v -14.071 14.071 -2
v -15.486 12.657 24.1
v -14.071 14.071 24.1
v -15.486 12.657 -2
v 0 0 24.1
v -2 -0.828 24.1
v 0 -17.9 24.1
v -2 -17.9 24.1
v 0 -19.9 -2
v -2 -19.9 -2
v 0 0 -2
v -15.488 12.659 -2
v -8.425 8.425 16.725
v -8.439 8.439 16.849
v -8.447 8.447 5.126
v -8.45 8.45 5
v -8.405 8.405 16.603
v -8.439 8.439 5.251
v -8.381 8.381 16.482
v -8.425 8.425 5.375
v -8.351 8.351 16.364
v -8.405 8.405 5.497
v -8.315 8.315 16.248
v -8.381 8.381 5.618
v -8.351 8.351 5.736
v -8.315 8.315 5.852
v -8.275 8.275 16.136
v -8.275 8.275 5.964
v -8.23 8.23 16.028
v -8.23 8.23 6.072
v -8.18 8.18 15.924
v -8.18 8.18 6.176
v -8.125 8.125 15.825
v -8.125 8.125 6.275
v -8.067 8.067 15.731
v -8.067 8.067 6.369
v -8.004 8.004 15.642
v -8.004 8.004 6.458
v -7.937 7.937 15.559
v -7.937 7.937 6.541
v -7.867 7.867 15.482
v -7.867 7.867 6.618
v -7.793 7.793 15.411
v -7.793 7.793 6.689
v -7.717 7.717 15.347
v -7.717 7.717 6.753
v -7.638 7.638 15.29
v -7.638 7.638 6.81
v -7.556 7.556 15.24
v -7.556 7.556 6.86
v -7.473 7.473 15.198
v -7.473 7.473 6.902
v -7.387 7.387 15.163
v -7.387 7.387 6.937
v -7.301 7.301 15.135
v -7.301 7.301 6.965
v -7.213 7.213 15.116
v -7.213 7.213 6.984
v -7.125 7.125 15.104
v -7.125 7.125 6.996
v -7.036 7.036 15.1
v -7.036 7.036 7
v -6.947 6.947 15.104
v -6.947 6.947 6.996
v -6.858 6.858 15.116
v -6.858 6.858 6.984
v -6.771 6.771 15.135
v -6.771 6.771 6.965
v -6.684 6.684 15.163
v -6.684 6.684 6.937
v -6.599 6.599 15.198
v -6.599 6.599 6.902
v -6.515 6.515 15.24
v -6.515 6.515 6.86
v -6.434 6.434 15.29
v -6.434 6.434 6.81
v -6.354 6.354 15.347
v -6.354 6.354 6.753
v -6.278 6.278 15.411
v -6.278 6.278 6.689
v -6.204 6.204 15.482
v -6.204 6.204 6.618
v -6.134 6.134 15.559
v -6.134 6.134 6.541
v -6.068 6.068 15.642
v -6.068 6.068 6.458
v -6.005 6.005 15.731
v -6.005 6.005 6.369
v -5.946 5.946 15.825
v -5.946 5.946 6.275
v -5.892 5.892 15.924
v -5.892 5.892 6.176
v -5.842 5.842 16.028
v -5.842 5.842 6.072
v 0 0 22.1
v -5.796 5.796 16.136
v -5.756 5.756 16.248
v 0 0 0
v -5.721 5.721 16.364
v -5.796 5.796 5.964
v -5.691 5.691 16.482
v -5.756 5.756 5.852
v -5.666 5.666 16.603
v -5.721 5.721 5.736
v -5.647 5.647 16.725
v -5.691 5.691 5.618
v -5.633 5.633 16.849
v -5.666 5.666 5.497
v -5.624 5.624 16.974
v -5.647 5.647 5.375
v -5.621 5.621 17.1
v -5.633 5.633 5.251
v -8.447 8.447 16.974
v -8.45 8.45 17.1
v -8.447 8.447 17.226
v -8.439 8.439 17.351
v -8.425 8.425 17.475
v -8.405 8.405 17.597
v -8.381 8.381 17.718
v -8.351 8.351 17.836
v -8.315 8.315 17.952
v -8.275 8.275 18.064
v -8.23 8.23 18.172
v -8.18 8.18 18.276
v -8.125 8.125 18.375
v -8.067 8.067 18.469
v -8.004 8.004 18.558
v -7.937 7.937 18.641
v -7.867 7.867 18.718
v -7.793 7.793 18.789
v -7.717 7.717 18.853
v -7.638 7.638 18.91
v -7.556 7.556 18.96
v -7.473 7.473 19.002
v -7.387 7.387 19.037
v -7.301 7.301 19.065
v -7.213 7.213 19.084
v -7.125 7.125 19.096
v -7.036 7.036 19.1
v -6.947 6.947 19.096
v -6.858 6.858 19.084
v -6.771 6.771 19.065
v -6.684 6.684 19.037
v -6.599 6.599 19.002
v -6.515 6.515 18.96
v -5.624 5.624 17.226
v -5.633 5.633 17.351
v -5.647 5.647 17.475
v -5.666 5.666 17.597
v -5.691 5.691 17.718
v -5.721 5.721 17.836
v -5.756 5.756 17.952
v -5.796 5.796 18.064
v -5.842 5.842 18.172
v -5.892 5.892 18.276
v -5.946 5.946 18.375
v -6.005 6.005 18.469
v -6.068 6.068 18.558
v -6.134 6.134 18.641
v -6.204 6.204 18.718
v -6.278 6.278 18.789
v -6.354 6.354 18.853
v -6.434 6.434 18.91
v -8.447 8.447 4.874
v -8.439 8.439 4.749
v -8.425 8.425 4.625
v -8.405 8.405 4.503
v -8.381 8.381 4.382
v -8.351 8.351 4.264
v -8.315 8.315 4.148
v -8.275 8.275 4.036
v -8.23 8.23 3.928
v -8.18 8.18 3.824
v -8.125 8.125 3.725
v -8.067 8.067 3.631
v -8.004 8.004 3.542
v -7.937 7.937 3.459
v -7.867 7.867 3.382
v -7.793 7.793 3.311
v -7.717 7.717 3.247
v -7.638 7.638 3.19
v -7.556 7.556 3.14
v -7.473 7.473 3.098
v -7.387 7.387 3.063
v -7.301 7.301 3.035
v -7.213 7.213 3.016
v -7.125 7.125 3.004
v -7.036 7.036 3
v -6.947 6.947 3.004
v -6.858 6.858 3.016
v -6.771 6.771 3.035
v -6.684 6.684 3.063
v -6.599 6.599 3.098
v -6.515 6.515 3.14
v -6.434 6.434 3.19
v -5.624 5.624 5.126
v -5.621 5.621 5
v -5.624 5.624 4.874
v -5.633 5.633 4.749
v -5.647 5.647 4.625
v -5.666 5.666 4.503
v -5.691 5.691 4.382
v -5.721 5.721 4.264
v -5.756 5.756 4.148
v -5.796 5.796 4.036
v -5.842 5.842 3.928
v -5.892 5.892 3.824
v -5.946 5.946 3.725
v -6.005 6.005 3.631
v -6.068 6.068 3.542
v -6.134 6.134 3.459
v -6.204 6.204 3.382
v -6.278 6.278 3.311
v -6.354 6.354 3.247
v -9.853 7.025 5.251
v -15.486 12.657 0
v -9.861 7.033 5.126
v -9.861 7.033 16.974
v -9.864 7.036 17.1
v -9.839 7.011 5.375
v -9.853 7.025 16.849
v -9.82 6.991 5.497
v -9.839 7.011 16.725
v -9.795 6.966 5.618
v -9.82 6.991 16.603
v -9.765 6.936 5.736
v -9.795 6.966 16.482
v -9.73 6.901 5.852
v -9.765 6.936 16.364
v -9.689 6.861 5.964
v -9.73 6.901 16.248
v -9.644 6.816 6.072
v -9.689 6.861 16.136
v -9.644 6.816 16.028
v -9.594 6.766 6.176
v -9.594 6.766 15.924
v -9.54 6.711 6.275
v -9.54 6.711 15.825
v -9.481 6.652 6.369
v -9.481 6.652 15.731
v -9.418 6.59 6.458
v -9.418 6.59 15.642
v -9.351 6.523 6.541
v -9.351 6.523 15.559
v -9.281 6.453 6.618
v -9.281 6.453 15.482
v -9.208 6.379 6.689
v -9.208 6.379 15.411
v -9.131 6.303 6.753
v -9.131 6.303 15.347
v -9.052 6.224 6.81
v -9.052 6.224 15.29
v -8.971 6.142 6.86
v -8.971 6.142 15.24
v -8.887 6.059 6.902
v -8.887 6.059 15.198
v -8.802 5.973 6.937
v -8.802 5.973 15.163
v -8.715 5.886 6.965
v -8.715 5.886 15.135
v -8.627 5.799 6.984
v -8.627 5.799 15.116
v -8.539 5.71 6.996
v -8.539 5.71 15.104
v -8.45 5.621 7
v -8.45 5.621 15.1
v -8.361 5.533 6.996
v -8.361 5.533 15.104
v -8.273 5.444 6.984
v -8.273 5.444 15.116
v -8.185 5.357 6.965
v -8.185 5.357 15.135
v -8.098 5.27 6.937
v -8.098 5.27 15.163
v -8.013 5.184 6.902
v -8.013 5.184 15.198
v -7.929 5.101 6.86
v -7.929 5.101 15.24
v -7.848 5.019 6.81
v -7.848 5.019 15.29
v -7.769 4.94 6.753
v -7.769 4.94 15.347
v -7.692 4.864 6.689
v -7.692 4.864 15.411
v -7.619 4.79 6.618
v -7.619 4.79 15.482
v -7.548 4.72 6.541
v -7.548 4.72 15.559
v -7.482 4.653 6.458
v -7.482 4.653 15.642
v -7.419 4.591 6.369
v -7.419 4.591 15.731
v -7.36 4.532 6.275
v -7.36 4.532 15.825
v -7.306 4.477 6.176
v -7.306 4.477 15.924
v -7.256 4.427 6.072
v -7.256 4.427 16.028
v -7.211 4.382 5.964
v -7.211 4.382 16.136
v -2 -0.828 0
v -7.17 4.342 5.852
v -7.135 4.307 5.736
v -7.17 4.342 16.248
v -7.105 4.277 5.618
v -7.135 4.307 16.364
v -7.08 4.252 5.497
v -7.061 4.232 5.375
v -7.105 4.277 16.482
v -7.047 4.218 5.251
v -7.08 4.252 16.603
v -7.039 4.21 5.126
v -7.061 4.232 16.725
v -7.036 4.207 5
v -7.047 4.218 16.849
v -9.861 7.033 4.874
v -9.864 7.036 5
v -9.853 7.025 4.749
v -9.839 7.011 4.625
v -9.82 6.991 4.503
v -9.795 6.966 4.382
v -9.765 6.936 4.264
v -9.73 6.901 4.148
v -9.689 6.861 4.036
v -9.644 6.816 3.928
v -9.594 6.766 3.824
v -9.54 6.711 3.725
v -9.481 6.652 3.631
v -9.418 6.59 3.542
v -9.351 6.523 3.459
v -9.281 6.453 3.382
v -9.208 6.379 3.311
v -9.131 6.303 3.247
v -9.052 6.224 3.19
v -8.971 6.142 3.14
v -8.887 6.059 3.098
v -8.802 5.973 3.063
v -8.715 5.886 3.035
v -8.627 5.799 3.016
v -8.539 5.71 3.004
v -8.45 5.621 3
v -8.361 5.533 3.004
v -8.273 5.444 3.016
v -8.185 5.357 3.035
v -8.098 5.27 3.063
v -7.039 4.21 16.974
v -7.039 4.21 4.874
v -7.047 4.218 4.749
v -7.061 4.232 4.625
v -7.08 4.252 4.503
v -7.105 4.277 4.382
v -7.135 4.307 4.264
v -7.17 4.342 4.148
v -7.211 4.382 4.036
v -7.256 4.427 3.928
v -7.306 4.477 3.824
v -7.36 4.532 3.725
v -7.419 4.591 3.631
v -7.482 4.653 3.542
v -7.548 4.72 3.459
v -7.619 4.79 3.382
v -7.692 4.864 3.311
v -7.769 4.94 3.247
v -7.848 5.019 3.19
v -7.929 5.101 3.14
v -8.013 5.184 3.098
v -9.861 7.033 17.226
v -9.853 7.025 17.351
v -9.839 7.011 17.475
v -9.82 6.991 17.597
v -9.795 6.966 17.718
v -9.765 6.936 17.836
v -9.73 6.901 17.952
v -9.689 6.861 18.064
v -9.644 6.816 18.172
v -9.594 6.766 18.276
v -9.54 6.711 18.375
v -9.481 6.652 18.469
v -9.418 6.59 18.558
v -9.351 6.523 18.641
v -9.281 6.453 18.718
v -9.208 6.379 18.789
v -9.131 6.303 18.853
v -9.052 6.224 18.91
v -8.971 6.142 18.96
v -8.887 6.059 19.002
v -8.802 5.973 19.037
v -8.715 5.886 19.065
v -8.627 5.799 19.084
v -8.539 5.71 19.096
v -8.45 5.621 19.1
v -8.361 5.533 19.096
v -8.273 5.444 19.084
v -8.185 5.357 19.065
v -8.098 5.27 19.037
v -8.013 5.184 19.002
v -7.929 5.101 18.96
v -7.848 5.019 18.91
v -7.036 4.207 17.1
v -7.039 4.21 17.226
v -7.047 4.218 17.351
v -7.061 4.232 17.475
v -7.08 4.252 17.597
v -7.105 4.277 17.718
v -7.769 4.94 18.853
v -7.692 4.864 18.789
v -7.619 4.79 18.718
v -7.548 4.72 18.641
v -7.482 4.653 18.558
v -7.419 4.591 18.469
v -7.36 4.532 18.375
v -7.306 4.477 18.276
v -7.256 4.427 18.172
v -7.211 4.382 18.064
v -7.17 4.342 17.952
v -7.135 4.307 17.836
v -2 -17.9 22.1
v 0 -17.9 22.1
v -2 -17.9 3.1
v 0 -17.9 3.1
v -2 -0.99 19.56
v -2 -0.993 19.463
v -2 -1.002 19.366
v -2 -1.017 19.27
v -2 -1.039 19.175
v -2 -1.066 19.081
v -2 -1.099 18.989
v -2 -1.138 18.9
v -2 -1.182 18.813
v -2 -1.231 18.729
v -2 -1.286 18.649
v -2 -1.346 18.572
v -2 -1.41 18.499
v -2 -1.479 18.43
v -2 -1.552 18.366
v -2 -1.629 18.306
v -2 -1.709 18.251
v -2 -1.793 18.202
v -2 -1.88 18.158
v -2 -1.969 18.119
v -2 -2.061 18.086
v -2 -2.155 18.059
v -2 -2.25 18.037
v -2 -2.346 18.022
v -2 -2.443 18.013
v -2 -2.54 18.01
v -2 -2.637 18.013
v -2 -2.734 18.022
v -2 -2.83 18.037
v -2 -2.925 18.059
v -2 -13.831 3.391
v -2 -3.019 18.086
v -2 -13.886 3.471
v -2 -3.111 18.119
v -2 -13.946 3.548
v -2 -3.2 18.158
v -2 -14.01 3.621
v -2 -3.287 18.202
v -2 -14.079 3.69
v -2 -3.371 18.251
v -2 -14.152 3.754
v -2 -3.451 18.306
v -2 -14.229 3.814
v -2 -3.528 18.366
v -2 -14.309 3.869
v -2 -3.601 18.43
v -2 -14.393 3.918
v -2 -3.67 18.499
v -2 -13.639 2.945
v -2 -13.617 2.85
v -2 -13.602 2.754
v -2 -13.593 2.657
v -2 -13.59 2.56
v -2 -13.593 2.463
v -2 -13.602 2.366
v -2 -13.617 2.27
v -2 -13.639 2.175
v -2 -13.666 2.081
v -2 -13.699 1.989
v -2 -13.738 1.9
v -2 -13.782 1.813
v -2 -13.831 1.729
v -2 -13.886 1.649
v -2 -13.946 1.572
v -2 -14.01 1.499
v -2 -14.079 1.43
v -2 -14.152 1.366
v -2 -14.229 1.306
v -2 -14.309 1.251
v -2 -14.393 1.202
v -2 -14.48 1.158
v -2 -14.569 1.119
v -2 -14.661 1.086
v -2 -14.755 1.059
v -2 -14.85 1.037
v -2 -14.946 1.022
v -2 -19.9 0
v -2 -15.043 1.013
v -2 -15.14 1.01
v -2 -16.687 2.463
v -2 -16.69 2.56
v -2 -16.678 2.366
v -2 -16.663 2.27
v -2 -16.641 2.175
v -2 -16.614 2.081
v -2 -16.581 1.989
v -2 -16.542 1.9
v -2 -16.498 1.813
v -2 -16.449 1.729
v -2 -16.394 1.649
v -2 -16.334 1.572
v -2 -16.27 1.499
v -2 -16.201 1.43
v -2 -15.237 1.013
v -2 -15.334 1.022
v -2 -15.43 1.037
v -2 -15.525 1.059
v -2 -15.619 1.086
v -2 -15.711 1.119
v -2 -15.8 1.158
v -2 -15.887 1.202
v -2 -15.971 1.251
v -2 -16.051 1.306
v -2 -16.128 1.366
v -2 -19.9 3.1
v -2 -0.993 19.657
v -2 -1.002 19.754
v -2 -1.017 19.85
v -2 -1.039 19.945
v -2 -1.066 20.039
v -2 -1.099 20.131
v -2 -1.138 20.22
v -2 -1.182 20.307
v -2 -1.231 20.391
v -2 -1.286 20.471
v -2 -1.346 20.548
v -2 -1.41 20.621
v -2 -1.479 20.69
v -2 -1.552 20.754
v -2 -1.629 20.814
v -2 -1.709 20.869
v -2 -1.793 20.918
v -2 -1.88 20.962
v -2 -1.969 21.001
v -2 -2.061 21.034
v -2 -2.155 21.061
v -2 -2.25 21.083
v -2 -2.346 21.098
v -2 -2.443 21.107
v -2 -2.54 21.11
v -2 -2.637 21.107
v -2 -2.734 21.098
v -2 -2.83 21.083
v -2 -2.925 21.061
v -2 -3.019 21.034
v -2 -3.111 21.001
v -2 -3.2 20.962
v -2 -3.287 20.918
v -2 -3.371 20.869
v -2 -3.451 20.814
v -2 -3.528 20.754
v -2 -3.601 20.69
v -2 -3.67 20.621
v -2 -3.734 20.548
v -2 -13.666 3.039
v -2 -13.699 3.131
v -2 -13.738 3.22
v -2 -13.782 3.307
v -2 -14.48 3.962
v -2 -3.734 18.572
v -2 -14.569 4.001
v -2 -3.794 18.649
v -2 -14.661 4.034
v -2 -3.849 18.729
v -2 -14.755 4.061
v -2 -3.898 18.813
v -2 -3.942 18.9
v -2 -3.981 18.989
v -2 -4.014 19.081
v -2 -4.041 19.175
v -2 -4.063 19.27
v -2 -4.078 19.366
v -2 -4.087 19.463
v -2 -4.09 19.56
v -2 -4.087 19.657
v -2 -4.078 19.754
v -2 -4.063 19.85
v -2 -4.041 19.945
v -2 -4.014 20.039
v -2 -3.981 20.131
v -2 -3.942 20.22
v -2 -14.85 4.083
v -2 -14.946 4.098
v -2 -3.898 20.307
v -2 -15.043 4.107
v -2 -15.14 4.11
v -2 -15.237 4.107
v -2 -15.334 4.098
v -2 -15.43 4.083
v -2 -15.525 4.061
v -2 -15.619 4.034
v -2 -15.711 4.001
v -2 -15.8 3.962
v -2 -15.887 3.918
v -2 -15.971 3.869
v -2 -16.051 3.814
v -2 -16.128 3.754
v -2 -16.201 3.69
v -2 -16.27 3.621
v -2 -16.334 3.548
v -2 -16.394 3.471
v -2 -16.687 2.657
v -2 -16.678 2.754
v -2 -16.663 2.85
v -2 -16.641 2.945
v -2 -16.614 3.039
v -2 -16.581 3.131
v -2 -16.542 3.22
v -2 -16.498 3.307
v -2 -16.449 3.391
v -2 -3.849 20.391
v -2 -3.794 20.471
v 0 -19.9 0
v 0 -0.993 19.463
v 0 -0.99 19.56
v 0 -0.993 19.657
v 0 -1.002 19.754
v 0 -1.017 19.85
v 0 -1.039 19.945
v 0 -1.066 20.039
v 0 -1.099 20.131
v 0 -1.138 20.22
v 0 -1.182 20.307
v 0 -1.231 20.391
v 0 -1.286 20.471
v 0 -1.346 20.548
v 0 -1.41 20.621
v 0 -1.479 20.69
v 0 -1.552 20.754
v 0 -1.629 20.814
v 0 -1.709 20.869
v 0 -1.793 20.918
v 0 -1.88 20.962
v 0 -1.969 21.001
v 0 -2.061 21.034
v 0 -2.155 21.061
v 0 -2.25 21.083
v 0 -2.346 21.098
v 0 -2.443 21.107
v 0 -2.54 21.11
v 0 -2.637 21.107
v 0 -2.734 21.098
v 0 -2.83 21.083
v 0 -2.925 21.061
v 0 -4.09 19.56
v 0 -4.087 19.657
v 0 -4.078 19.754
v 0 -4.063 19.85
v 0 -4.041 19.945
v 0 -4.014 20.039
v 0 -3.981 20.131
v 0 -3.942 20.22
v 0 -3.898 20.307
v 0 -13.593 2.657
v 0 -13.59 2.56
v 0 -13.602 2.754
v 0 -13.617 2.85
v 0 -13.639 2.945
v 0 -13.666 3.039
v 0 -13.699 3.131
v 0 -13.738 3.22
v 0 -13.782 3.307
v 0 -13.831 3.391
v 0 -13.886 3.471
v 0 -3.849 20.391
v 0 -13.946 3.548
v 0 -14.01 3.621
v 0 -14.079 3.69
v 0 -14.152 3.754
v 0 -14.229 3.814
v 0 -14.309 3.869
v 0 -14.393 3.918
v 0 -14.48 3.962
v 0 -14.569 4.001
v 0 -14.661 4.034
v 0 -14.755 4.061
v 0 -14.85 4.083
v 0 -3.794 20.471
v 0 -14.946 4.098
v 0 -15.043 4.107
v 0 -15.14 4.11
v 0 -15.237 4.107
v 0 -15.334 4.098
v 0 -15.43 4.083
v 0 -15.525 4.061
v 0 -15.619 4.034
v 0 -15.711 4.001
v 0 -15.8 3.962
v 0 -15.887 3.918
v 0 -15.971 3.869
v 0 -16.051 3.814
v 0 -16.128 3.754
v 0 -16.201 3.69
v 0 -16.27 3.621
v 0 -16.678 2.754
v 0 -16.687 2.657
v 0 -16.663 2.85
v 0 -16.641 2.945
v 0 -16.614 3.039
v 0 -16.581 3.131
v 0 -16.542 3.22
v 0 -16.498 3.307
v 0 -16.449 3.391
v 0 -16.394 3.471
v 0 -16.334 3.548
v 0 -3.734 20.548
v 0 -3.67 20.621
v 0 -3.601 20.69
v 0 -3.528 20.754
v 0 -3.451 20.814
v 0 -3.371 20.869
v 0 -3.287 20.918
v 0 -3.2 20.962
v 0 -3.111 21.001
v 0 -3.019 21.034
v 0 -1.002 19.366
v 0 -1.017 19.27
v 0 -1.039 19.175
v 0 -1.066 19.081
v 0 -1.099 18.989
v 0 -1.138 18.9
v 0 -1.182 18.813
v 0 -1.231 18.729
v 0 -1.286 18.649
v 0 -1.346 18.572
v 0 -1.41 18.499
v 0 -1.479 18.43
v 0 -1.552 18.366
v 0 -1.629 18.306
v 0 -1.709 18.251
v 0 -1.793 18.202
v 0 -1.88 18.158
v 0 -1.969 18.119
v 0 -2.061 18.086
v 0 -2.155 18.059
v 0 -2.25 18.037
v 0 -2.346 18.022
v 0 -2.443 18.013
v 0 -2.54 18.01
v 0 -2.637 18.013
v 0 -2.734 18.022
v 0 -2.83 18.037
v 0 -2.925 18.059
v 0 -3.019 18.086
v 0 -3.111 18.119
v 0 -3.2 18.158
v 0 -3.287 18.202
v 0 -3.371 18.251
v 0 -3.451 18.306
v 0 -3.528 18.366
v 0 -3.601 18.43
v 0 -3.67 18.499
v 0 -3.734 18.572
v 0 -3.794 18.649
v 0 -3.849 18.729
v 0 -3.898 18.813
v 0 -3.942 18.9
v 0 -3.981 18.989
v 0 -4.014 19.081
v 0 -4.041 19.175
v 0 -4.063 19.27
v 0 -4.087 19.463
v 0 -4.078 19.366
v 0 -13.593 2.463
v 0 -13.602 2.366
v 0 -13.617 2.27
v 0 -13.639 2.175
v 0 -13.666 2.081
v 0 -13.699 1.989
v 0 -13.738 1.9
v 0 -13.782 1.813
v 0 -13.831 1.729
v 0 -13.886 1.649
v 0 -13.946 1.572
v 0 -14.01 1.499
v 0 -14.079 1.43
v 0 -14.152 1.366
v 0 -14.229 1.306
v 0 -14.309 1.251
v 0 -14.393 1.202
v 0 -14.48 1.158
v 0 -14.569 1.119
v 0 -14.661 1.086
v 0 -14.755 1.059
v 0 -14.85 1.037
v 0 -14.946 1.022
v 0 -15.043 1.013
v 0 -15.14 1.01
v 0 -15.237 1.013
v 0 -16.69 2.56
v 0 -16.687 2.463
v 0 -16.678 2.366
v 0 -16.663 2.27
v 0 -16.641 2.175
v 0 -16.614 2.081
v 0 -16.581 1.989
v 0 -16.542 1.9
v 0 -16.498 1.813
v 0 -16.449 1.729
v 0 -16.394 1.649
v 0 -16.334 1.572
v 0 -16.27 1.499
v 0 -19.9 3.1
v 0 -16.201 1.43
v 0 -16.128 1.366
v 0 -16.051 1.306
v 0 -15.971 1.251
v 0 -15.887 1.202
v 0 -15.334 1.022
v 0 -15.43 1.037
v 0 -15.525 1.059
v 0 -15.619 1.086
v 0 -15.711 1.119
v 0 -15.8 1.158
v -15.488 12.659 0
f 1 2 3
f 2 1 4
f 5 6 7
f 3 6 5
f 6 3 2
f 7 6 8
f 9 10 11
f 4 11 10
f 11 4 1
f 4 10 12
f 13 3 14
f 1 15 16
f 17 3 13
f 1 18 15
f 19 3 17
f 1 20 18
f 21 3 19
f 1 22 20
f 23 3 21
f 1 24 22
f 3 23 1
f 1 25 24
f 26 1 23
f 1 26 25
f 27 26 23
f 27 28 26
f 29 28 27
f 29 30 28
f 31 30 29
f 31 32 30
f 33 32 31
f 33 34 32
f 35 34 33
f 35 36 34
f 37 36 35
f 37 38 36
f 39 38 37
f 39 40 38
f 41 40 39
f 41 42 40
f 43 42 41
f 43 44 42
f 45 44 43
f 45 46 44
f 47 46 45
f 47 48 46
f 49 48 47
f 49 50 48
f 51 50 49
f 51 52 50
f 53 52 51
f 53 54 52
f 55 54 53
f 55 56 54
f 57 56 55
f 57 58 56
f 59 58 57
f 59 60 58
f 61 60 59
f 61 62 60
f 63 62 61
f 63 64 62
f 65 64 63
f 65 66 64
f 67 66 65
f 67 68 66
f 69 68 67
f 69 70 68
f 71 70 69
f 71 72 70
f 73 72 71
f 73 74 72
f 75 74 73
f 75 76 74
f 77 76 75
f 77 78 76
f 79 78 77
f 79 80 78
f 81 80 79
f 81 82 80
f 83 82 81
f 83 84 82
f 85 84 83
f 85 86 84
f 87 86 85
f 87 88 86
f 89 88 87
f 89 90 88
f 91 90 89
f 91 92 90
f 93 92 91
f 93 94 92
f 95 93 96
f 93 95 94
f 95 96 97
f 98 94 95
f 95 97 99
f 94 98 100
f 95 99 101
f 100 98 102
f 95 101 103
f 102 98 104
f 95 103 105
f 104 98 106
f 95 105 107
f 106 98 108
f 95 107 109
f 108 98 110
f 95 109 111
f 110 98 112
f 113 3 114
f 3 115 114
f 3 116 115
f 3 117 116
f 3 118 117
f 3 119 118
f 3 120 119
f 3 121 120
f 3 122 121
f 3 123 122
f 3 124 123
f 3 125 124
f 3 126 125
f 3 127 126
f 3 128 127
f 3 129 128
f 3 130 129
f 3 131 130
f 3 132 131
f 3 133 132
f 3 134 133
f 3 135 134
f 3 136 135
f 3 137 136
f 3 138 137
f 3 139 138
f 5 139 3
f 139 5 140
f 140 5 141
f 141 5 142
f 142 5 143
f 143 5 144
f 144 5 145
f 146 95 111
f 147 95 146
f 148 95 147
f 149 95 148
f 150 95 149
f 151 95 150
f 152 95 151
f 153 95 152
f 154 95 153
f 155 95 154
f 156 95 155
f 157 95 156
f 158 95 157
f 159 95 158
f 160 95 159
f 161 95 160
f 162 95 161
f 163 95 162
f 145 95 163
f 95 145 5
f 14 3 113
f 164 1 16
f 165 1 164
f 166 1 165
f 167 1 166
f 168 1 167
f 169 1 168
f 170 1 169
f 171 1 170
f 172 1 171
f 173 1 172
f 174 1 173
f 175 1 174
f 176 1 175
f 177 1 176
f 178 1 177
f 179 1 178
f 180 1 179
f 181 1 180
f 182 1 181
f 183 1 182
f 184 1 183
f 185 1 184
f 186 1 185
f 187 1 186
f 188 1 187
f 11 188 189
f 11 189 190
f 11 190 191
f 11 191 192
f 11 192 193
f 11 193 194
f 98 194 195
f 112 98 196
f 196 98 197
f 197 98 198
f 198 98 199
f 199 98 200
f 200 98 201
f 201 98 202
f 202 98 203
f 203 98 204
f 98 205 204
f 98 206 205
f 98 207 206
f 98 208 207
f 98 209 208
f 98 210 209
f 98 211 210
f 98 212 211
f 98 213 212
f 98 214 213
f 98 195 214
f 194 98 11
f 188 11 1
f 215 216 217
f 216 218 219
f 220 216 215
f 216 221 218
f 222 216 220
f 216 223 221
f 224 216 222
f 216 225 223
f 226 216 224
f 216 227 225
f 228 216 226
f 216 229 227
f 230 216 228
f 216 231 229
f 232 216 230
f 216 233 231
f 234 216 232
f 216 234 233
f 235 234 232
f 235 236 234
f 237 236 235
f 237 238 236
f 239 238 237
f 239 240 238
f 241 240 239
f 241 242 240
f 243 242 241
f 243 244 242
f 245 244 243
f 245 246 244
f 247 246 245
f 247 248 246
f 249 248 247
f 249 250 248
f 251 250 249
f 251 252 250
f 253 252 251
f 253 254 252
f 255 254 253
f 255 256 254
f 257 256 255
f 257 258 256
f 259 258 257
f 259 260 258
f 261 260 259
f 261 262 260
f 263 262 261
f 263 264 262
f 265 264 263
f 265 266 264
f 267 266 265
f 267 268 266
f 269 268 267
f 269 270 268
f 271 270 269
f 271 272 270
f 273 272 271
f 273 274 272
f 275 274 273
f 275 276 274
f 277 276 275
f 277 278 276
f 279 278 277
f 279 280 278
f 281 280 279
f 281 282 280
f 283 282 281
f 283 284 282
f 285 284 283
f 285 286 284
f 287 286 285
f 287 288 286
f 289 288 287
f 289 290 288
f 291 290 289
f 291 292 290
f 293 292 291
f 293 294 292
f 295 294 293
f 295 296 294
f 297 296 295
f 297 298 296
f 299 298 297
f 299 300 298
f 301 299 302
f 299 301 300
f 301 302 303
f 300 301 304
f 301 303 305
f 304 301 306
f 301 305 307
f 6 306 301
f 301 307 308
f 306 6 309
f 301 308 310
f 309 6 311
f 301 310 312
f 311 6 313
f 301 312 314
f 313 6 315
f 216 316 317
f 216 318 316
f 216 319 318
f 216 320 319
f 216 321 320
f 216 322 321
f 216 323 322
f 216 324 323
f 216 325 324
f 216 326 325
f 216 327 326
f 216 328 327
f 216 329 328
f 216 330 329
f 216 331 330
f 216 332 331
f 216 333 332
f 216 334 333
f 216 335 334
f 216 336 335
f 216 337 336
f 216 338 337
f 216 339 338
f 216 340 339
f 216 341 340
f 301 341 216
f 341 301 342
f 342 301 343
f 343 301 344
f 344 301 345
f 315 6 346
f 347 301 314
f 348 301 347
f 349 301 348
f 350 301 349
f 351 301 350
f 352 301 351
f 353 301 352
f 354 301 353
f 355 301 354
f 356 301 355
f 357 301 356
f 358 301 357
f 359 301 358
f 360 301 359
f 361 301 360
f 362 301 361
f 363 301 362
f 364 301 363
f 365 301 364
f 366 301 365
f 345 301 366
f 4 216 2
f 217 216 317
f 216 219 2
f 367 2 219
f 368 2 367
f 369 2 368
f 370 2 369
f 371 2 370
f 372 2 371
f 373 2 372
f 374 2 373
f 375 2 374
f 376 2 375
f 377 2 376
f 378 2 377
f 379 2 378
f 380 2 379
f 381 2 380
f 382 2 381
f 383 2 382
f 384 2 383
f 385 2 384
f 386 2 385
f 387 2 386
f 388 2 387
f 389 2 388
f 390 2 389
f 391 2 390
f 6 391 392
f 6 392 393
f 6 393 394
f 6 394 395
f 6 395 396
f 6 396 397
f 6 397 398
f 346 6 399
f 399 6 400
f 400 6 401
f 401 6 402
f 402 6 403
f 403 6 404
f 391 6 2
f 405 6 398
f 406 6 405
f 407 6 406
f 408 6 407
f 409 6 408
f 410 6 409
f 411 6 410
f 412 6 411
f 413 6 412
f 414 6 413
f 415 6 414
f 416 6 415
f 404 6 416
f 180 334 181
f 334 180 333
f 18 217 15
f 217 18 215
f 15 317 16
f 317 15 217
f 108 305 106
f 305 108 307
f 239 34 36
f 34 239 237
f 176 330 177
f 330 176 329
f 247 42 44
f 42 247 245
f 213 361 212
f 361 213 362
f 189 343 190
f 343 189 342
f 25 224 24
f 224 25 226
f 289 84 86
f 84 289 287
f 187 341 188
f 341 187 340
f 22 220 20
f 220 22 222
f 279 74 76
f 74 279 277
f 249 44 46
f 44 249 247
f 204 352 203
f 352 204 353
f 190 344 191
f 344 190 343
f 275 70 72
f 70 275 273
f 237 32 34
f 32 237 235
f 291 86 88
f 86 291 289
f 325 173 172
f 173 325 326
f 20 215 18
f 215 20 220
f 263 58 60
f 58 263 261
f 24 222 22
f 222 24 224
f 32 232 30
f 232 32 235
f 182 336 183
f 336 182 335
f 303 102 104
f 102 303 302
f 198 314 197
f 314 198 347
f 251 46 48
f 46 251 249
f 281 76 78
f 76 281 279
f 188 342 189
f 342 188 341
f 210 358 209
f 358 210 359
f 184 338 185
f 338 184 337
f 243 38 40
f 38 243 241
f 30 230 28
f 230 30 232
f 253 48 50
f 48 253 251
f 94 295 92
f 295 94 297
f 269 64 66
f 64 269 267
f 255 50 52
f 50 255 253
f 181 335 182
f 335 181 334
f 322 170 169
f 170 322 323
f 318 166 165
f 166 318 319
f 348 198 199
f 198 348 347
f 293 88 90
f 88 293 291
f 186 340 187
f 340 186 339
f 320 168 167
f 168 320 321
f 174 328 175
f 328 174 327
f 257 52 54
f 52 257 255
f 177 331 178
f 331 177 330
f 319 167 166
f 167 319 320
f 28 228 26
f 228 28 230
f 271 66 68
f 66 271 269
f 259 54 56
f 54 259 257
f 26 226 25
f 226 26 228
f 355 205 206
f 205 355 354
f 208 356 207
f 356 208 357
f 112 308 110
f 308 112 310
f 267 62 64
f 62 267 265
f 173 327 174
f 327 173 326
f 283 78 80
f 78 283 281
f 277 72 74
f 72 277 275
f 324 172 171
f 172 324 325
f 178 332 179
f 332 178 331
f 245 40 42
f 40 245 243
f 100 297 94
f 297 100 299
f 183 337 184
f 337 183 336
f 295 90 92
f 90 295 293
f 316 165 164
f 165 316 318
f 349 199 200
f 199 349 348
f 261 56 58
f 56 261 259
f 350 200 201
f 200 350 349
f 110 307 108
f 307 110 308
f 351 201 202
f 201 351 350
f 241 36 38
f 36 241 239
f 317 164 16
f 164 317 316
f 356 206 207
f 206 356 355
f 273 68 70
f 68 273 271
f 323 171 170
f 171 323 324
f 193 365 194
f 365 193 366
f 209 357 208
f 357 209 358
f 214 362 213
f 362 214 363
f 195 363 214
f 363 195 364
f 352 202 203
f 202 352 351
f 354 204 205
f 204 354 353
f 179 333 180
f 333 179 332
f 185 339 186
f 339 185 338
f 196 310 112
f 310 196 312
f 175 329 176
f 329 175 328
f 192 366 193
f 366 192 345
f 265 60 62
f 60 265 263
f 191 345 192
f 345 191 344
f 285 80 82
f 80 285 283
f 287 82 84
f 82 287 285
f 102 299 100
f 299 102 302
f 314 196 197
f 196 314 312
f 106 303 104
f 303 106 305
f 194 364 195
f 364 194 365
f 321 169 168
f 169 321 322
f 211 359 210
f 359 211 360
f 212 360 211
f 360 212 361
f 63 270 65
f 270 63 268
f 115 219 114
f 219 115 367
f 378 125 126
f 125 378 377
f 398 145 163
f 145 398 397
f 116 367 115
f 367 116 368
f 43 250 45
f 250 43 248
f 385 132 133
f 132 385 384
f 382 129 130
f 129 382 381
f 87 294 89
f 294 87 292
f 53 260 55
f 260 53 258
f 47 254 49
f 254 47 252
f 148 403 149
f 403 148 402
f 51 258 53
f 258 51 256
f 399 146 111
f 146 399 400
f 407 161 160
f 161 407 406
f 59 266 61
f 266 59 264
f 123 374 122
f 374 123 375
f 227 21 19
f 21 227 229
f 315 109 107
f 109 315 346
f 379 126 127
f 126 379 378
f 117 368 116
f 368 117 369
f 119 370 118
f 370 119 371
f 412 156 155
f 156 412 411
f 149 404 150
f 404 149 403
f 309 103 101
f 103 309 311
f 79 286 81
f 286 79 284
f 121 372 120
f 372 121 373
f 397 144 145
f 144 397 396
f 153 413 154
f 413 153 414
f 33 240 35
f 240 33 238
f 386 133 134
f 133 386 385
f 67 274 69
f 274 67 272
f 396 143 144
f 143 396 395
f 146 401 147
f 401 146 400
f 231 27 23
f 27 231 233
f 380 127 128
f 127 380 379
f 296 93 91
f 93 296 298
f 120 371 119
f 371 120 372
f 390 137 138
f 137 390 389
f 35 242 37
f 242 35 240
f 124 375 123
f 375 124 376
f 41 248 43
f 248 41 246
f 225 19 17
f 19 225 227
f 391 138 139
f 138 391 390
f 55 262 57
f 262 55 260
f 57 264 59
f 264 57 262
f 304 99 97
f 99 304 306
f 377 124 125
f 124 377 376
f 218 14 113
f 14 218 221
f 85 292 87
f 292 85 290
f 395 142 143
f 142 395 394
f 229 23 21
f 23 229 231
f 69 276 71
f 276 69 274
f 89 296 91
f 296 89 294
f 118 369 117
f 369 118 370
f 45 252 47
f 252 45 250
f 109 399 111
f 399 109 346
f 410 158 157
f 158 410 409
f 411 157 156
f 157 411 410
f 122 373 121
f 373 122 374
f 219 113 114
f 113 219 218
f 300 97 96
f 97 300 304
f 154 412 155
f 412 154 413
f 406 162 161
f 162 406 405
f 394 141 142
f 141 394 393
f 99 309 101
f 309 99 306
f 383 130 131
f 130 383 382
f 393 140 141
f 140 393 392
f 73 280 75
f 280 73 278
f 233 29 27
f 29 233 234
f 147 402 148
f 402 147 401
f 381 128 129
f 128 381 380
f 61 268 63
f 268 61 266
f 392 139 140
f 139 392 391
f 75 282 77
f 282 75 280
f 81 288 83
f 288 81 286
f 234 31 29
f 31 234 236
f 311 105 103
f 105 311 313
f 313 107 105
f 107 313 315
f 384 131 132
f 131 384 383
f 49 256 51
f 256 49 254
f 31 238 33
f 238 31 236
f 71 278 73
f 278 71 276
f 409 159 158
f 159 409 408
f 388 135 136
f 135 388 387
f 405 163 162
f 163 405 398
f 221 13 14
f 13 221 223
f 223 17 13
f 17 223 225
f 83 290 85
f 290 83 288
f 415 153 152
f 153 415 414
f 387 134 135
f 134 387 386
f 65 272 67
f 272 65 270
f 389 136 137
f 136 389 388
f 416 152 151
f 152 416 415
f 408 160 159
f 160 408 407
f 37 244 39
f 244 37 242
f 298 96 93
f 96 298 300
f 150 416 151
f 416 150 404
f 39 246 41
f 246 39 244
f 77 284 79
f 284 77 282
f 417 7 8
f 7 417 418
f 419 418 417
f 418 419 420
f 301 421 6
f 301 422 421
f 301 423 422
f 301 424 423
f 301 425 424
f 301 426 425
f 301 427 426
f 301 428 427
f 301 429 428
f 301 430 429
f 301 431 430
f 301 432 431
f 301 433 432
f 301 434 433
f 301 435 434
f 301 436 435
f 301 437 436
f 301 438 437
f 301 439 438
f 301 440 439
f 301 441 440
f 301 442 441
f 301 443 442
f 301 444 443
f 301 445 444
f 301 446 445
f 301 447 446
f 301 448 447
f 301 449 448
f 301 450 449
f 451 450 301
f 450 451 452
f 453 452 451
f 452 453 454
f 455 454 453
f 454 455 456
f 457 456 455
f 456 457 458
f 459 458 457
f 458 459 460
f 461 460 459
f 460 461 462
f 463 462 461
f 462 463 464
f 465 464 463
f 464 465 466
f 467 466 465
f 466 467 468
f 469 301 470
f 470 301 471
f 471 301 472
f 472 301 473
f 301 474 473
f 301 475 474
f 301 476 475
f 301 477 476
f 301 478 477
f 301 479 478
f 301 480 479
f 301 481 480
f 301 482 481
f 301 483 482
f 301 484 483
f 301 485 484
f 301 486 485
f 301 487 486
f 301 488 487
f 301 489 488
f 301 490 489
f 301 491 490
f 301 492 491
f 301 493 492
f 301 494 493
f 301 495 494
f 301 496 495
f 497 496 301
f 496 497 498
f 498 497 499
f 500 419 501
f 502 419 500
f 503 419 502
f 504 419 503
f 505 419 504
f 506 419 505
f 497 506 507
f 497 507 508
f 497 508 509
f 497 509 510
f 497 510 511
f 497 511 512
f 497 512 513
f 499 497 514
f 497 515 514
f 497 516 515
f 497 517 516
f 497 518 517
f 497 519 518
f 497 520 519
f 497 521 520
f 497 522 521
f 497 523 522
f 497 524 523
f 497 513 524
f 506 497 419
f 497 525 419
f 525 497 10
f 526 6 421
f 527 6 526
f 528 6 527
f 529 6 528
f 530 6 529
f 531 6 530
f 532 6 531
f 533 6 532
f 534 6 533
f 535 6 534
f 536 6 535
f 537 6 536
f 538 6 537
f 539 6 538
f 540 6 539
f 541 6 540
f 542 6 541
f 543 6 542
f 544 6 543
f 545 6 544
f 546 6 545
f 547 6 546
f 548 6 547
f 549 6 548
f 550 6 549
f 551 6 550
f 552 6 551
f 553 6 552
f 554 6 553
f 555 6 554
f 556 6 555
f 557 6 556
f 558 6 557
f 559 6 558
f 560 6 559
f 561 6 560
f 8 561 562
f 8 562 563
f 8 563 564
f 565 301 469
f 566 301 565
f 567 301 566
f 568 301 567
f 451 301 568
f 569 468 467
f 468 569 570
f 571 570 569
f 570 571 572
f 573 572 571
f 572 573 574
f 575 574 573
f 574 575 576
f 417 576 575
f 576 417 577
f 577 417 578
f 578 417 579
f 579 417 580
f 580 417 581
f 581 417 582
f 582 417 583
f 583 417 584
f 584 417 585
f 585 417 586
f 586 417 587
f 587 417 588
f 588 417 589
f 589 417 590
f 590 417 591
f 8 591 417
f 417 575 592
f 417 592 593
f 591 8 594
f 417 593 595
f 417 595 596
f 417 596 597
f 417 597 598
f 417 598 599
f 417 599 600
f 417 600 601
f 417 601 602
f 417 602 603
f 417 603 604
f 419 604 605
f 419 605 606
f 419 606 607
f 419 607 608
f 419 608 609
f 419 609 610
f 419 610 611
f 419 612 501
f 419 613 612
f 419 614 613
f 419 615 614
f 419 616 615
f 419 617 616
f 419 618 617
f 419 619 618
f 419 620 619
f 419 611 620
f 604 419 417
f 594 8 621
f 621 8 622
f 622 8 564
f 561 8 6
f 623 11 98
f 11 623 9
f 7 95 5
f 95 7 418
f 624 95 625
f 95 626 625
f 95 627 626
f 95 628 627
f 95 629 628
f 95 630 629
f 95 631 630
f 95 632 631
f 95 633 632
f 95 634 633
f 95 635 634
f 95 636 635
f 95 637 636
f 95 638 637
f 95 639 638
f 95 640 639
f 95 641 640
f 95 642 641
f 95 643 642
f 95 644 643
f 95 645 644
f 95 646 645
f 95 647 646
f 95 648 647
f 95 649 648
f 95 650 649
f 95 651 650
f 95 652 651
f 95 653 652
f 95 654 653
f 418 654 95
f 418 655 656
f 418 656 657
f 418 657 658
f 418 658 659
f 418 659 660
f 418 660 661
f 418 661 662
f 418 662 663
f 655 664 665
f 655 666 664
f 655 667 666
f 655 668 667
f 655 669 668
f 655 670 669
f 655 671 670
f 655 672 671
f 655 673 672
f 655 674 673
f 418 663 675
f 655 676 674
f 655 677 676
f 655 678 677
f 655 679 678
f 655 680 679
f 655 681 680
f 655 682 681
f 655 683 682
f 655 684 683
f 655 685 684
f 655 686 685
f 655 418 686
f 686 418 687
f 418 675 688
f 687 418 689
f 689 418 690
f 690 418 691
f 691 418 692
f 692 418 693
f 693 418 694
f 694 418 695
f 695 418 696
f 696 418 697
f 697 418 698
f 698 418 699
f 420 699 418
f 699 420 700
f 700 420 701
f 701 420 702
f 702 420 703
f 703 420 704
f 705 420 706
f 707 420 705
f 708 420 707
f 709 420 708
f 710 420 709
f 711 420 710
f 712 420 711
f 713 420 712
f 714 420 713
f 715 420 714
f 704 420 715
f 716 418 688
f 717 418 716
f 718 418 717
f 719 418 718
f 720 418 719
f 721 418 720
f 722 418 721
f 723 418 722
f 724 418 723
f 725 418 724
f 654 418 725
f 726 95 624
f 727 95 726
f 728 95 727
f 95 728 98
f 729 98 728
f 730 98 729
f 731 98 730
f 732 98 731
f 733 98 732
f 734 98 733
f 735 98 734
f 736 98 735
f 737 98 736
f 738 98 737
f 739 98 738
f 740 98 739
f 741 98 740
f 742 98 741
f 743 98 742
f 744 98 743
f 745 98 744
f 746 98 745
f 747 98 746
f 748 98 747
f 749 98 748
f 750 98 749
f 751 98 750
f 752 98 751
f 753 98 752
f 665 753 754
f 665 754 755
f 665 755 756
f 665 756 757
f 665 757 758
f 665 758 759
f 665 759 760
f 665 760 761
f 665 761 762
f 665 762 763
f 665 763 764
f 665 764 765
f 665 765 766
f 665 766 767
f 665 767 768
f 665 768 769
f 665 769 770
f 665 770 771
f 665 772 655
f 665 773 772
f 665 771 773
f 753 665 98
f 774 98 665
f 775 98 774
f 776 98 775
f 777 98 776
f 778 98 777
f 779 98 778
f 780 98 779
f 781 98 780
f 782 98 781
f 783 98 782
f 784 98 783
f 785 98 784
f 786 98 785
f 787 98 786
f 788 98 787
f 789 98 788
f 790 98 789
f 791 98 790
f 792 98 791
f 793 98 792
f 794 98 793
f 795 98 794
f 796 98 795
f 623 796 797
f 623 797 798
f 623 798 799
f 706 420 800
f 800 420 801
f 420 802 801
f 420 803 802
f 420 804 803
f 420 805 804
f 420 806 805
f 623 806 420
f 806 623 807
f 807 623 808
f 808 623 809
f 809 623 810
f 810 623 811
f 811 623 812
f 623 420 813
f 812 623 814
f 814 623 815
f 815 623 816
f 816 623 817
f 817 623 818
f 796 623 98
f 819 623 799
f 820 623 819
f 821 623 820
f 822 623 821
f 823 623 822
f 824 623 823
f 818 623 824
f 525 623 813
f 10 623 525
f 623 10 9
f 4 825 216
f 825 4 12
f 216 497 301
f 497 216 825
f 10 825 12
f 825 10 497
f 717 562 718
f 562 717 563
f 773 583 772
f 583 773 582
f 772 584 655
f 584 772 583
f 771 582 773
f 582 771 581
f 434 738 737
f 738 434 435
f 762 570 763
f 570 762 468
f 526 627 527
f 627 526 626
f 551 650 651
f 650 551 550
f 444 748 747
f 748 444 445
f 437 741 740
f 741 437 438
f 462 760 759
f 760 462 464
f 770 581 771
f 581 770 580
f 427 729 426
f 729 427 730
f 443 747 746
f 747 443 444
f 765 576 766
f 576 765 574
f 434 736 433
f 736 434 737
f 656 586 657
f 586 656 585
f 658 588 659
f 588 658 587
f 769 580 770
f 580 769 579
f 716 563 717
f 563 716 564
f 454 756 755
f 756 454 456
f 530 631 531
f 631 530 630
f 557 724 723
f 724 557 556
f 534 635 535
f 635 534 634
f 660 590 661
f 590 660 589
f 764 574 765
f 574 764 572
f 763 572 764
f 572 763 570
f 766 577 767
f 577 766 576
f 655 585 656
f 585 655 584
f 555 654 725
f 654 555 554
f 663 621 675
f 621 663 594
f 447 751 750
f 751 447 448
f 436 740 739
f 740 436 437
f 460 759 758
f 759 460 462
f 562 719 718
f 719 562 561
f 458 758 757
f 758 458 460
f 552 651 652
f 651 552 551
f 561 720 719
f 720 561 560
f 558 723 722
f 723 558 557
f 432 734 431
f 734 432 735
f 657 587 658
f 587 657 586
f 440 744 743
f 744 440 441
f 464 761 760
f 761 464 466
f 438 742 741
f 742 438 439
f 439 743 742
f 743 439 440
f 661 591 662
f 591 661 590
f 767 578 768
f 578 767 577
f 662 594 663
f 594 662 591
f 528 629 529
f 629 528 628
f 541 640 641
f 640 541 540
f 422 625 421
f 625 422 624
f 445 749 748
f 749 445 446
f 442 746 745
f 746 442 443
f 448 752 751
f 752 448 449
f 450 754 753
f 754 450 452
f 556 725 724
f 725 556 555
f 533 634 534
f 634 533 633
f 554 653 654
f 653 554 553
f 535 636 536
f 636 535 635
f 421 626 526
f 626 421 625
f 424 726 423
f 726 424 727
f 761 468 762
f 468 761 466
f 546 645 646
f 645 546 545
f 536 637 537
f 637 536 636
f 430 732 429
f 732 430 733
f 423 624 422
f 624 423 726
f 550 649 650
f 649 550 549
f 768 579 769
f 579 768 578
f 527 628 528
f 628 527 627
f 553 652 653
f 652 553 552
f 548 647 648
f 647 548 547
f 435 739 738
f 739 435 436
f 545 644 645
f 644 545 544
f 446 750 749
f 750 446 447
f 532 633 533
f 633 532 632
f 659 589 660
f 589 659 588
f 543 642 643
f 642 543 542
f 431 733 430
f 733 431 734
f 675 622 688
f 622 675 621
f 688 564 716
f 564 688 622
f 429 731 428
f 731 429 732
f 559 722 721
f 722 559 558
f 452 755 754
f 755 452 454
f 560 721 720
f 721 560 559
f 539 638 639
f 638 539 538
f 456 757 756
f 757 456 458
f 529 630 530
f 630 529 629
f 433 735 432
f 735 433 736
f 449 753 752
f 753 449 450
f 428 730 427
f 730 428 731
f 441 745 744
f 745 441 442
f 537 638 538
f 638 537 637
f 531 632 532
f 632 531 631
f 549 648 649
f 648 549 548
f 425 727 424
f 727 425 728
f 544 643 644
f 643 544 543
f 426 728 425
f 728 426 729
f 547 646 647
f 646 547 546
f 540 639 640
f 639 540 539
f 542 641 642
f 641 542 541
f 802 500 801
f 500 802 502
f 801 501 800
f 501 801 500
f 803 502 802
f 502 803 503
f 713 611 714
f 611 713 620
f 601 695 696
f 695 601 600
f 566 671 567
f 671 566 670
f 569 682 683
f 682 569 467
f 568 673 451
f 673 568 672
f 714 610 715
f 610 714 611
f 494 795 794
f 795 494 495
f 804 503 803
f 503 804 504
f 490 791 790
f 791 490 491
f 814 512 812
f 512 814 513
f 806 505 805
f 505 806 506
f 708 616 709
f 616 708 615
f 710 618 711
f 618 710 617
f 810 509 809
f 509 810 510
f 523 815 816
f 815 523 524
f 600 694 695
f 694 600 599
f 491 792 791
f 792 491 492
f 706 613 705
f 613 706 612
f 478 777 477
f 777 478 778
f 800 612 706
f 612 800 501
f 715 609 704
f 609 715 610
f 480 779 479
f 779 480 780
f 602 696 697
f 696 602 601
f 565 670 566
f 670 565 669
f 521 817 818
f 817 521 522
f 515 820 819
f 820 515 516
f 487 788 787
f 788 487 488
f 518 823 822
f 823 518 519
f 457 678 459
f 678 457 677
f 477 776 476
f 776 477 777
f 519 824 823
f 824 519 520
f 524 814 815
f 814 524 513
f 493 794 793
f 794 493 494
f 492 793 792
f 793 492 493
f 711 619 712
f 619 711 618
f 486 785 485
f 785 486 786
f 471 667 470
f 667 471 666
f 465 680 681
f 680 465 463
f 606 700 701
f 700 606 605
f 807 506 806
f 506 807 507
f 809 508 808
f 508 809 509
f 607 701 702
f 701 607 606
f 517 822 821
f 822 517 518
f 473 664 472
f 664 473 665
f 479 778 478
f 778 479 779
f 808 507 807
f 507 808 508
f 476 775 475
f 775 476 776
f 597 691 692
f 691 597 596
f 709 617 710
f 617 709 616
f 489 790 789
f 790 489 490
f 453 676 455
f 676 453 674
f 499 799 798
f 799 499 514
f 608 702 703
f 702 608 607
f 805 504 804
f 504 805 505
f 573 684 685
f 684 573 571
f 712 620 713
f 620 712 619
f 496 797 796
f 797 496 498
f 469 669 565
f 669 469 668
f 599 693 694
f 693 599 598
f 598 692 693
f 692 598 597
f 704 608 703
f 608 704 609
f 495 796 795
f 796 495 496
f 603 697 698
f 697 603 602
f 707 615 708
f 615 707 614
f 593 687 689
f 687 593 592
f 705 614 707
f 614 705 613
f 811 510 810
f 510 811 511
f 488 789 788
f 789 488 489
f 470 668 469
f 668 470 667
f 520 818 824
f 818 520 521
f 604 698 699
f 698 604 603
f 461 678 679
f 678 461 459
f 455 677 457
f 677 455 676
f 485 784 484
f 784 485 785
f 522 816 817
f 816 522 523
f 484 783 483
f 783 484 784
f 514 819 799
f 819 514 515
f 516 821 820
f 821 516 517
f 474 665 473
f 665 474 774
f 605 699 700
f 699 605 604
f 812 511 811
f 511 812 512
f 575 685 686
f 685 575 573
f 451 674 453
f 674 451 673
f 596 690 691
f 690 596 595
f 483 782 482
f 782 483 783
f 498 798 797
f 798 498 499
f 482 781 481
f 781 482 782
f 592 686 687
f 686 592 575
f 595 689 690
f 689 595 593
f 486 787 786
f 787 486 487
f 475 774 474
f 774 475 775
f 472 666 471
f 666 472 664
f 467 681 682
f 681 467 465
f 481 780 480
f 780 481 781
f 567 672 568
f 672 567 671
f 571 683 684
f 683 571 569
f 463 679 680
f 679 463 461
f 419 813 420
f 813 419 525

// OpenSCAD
// file: capteur_US.scad
$fn=100;

capteurUS_largeur = 19.9;
capteurUS_longueur= 22.1;
capteurUS_ep_PCB= 1.7;

module capteur_US_base() {
    cube([capteurUS_largeur,capteurUS_longueur,capteurUS_ep_PCB]);
    translate([2.54,2.54])
        cylinder(d=3.1, h=20, center=true);
    translate([2.54+12.6,2.54+17])
        cylinder(d=3.1, h=20, center=true);
    translate([9,capteurUS_longueur/2])cylinder(d=16.4, h=15.5);
    translate([17.9,0,-7]) cube([2,19,7]);
}
module capteur_US() {
    translate([-capteurUS_largeur/2,-capteurUS_longueur/2])capteur_US_base();
}
// main file
$fn=50;
carre_haut=18*sqrt(2);
carre_bas=35;
hauteur=12-3-3; //longueur capteur-epaisseur plaque-long_vis
hauteur_support=hauteur+22.2;
epaisseur_haut=3;
epaisseur_bas=5;
long_vis=3;
dia_vis=4;
dia_trou_vis=2;
ecart_vis=21.7;
ecart_fixation=35;
dia_fixation=6;
dia_trou_fixation=4;
epaisseur_fixation=2;
include <capteur_US.scad>

difference() {
    mirror([1,1,0]) {
        translate([0,0,-2])
            cube([capteurUS_largeur-2,2,capteurUS_longueur+4]);
        translate([0,0,-2])
            cube([capteurUS_largeur,2,capteurUS_longueur]);
        
        translate([0,0,-2])linear_extrude(height=2) {
            polygon([
                [0,0],
                [capteurUS_largeur,2],
                [(-capteurUS_largeur+2)/1.414,
                 ( capteurUS_largeur+2)/1.414]]);
        }
        rotate([0,0,90+45]) difference() {
            translate([0,-2,-2]) cube([capteurUS_largeur,2,capteurUS_longueur+4]);
            translate([capteurUS_largeur/2,0,5])rotate([90,0,0])
                cylinder(d=dia_trou_fixation, h=100);
            translate([capteurUS_largeur/2,0,capteurUS_longueur-5])rotate([90,0,0])
                cylinder(d=dia_trou_fixation, h=100);
        }
        
    }
    
    
translate([0,-capteurUS_largeur/2,capteurUS_longueur/2])
    rotate([-90,0,-90])#capteur_US();
}
